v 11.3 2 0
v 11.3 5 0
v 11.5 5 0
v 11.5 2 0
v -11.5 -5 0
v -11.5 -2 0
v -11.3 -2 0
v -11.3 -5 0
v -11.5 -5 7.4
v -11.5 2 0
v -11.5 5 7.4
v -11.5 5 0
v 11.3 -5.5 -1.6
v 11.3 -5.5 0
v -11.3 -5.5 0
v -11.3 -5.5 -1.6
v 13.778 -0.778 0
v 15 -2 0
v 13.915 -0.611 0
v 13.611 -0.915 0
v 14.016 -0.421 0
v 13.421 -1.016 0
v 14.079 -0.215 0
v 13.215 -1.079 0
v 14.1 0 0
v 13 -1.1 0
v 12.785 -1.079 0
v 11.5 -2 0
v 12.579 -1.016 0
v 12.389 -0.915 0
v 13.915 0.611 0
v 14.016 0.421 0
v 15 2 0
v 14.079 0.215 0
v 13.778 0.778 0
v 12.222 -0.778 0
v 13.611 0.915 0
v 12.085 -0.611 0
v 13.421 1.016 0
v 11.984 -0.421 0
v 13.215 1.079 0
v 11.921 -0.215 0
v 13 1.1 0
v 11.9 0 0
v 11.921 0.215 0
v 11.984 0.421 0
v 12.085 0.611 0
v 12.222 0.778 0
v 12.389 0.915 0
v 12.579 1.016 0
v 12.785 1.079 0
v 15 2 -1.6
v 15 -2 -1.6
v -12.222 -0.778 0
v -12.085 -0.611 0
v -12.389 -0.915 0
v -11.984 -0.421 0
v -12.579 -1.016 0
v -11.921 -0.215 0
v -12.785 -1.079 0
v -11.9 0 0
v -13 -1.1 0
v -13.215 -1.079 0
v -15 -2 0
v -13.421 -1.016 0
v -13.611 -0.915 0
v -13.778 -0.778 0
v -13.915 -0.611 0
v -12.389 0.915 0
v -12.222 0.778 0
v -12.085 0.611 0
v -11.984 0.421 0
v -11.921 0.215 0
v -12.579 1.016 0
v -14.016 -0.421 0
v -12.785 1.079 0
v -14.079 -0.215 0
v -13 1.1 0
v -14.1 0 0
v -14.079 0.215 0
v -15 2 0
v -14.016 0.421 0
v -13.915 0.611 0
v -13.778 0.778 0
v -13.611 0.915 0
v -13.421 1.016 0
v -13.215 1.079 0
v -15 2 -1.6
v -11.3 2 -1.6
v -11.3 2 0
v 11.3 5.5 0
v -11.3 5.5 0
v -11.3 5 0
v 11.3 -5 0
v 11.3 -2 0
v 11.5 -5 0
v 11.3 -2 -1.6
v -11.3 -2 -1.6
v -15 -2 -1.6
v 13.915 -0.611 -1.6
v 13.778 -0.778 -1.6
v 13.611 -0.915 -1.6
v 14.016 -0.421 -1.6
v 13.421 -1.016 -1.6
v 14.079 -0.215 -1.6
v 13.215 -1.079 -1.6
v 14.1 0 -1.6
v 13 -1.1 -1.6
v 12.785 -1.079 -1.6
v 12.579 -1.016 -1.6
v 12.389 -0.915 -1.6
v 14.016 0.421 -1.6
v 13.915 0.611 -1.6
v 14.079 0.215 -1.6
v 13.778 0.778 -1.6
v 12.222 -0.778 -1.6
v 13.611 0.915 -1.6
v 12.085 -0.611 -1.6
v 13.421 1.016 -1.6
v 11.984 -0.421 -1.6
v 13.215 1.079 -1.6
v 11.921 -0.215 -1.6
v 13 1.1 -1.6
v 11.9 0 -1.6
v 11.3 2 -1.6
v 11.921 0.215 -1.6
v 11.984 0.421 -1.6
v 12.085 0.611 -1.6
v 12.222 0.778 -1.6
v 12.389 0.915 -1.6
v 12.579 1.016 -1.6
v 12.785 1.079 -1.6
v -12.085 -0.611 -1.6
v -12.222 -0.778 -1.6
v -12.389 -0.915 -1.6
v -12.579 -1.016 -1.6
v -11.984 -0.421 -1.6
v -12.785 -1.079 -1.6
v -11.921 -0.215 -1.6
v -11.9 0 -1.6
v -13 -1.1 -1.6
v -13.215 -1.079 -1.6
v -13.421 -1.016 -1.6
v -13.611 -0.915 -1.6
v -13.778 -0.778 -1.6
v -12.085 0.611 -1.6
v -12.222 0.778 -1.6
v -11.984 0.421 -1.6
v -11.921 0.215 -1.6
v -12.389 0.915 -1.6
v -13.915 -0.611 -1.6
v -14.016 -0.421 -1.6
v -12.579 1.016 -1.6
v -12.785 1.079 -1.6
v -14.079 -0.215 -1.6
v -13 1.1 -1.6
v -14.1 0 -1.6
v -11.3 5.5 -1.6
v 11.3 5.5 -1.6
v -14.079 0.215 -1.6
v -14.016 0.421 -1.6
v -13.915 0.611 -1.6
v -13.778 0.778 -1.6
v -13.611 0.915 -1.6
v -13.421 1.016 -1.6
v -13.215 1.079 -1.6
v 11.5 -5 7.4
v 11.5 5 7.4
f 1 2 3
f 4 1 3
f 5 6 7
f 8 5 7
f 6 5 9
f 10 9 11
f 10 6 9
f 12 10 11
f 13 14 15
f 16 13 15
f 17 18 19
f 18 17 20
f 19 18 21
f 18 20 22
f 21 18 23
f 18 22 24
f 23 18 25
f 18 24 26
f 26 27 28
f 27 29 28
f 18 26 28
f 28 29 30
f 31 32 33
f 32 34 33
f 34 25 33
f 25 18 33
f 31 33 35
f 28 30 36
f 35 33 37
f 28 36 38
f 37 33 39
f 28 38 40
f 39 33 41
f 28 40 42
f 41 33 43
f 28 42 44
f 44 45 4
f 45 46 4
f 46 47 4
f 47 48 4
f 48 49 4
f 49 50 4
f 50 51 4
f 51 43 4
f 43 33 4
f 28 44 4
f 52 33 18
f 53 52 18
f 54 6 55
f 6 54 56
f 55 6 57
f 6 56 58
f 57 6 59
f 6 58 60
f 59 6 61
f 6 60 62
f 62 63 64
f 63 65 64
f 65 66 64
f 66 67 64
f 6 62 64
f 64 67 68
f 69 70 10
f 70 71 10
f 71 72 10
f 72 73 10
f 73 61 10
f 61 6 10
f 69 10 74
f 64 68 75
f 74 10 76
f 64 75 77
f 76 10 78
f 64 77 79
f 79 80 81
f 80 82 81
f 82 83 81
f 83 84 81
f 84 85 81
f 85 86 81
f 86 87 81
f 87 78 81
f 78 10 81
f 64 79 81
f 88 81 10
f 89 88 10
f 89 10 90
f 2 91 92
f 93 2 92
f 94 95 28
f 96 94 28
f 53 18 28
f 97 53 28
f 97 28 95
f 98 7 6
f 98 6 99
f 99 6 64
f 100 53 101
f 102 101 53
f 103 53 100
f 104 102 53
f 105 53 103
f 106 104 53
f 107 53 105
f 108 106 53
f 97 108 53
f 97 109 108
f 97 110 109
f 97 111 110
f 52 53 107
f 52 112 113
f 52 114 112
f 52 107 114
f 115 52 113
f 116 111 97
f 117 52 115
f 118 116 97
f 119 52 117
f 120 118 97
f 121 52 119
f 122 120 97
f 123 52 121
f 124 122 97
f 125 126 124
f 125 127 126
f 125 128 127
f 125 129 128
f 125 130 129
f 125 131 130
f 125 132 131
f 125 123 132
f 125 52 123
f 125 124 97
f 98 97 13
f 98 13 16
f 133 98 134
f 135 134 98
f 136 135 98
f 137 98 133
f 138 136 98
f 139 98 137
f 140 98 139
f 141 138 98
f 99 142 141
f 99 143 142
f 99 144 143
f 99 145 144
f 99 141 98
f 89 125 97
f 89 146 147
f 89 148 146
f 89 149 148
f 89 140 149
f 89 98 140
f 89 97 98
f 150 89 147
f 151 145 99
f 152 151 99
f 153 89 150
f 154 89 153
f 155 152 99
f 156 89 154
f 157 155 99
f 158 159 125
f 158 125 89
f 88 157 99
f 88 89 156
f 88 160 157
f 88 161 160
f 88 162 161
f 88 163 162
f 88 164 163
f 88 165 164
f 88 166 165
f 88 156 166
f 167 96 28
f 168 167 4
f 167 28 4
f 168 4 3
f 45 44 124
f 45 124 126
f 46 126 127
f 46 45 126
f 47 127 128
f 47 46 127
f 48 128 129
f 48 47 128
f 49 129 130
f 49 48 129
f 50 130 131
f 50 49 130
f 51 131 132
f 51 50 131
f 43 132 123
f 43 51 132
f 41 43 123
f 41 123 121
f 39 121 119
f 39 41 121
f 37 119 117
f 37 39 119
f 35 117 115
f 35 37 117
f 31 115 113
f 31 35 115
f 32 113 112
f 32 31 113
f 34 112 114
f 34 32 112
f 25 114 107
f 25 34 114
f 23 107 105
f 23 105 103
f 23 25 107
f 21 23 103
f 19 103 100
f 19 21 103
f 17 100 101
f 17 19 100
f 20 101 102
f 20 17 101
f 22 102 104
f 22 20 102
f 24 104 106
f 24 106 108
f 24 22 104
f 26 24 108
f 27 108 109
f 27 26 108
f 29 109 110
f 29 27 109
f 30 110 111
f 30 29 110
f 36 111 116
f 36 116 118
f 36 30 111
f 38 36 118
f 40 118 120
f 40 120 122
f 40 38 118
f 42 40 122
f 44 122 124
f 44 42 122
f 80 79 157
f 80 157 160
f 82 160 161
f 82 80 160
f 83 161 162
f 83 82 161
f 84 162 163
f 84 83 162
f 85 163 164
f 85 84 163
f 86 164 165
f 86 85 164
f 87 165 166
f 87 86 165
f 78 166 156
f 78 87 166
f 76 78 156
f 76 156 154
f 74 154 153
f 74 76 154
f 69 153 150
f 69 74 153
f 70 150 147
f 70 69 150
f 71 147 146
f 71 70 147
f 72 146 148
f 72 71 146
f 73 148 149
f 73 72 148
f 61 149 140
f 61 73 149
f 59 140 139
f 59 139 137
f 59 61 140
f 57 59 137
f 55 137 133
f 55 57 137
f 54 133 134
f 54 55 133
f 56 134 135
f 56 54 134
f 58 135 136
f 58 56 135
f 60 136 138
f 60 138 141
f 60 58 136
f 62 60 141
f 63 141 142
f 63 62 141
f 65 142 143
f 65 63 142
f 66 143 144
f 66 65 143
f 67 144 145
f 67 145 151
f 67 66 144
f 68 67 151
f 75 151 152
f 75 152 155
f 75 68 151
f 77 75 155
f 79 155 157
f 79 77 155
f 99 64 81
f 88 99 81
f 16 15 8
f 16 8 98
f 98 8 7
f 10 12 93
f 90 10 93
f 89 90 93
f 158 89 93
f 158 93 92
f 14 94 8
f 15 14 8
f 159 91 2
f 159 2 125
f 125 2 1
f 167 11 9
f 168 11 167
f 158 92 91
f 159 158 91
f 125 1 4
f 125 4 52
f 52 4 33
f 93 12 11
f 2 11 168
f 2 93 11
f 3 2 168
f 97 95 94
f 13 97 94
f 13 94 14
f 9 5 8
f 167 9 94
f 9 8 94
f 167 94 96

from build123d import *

# Parameters (mm, degrees)
SKETCH_1_W      = 23
SKETCH_1_H      = 10
EXTRUDE_1_DEPTH = 7.4
SKETCH_2_R      = 1.1
EXTRUDE_2_DEPTH = 1.6


with BuildPart() as part:
    # 草图1 → 凸台-拉伸1 (new body)
    with BuildSketch(Plane.XY):
        Rectangle(SKETCH_1_W, SKETCH_1_H)
    extrude(amount=EXTRUDE_1_DEPTH)

    # 草图2 → 凸台-拉伸2 (add)
    with BuildSketch(Plane(origin=(0, 0, 0), x_dir=(-1, 0, 0), z_dir=(0, 0, -1))):
        Polygon((-11.3, -2), (-11.3, -5.5), (11.3, -5.5), (11.3, -2), (15, -2), (15, 2), (11.3, 2), (11.3, 5.5), (-11.3, 5.5), (-11.3, 2), (-15, 2), (-15, -2), align=None)
        with Locations((-13, 0)):
            Circle(SKETCH_2_R, mode=Mode.SUBTRACT)
        with Locations((13, 0)):
            Circle(SKETCH_2_R, mode=Mode.SUBTRACT)
    extrude(amount=EXTRUDE_2_DEPTH)


solid = part.part
